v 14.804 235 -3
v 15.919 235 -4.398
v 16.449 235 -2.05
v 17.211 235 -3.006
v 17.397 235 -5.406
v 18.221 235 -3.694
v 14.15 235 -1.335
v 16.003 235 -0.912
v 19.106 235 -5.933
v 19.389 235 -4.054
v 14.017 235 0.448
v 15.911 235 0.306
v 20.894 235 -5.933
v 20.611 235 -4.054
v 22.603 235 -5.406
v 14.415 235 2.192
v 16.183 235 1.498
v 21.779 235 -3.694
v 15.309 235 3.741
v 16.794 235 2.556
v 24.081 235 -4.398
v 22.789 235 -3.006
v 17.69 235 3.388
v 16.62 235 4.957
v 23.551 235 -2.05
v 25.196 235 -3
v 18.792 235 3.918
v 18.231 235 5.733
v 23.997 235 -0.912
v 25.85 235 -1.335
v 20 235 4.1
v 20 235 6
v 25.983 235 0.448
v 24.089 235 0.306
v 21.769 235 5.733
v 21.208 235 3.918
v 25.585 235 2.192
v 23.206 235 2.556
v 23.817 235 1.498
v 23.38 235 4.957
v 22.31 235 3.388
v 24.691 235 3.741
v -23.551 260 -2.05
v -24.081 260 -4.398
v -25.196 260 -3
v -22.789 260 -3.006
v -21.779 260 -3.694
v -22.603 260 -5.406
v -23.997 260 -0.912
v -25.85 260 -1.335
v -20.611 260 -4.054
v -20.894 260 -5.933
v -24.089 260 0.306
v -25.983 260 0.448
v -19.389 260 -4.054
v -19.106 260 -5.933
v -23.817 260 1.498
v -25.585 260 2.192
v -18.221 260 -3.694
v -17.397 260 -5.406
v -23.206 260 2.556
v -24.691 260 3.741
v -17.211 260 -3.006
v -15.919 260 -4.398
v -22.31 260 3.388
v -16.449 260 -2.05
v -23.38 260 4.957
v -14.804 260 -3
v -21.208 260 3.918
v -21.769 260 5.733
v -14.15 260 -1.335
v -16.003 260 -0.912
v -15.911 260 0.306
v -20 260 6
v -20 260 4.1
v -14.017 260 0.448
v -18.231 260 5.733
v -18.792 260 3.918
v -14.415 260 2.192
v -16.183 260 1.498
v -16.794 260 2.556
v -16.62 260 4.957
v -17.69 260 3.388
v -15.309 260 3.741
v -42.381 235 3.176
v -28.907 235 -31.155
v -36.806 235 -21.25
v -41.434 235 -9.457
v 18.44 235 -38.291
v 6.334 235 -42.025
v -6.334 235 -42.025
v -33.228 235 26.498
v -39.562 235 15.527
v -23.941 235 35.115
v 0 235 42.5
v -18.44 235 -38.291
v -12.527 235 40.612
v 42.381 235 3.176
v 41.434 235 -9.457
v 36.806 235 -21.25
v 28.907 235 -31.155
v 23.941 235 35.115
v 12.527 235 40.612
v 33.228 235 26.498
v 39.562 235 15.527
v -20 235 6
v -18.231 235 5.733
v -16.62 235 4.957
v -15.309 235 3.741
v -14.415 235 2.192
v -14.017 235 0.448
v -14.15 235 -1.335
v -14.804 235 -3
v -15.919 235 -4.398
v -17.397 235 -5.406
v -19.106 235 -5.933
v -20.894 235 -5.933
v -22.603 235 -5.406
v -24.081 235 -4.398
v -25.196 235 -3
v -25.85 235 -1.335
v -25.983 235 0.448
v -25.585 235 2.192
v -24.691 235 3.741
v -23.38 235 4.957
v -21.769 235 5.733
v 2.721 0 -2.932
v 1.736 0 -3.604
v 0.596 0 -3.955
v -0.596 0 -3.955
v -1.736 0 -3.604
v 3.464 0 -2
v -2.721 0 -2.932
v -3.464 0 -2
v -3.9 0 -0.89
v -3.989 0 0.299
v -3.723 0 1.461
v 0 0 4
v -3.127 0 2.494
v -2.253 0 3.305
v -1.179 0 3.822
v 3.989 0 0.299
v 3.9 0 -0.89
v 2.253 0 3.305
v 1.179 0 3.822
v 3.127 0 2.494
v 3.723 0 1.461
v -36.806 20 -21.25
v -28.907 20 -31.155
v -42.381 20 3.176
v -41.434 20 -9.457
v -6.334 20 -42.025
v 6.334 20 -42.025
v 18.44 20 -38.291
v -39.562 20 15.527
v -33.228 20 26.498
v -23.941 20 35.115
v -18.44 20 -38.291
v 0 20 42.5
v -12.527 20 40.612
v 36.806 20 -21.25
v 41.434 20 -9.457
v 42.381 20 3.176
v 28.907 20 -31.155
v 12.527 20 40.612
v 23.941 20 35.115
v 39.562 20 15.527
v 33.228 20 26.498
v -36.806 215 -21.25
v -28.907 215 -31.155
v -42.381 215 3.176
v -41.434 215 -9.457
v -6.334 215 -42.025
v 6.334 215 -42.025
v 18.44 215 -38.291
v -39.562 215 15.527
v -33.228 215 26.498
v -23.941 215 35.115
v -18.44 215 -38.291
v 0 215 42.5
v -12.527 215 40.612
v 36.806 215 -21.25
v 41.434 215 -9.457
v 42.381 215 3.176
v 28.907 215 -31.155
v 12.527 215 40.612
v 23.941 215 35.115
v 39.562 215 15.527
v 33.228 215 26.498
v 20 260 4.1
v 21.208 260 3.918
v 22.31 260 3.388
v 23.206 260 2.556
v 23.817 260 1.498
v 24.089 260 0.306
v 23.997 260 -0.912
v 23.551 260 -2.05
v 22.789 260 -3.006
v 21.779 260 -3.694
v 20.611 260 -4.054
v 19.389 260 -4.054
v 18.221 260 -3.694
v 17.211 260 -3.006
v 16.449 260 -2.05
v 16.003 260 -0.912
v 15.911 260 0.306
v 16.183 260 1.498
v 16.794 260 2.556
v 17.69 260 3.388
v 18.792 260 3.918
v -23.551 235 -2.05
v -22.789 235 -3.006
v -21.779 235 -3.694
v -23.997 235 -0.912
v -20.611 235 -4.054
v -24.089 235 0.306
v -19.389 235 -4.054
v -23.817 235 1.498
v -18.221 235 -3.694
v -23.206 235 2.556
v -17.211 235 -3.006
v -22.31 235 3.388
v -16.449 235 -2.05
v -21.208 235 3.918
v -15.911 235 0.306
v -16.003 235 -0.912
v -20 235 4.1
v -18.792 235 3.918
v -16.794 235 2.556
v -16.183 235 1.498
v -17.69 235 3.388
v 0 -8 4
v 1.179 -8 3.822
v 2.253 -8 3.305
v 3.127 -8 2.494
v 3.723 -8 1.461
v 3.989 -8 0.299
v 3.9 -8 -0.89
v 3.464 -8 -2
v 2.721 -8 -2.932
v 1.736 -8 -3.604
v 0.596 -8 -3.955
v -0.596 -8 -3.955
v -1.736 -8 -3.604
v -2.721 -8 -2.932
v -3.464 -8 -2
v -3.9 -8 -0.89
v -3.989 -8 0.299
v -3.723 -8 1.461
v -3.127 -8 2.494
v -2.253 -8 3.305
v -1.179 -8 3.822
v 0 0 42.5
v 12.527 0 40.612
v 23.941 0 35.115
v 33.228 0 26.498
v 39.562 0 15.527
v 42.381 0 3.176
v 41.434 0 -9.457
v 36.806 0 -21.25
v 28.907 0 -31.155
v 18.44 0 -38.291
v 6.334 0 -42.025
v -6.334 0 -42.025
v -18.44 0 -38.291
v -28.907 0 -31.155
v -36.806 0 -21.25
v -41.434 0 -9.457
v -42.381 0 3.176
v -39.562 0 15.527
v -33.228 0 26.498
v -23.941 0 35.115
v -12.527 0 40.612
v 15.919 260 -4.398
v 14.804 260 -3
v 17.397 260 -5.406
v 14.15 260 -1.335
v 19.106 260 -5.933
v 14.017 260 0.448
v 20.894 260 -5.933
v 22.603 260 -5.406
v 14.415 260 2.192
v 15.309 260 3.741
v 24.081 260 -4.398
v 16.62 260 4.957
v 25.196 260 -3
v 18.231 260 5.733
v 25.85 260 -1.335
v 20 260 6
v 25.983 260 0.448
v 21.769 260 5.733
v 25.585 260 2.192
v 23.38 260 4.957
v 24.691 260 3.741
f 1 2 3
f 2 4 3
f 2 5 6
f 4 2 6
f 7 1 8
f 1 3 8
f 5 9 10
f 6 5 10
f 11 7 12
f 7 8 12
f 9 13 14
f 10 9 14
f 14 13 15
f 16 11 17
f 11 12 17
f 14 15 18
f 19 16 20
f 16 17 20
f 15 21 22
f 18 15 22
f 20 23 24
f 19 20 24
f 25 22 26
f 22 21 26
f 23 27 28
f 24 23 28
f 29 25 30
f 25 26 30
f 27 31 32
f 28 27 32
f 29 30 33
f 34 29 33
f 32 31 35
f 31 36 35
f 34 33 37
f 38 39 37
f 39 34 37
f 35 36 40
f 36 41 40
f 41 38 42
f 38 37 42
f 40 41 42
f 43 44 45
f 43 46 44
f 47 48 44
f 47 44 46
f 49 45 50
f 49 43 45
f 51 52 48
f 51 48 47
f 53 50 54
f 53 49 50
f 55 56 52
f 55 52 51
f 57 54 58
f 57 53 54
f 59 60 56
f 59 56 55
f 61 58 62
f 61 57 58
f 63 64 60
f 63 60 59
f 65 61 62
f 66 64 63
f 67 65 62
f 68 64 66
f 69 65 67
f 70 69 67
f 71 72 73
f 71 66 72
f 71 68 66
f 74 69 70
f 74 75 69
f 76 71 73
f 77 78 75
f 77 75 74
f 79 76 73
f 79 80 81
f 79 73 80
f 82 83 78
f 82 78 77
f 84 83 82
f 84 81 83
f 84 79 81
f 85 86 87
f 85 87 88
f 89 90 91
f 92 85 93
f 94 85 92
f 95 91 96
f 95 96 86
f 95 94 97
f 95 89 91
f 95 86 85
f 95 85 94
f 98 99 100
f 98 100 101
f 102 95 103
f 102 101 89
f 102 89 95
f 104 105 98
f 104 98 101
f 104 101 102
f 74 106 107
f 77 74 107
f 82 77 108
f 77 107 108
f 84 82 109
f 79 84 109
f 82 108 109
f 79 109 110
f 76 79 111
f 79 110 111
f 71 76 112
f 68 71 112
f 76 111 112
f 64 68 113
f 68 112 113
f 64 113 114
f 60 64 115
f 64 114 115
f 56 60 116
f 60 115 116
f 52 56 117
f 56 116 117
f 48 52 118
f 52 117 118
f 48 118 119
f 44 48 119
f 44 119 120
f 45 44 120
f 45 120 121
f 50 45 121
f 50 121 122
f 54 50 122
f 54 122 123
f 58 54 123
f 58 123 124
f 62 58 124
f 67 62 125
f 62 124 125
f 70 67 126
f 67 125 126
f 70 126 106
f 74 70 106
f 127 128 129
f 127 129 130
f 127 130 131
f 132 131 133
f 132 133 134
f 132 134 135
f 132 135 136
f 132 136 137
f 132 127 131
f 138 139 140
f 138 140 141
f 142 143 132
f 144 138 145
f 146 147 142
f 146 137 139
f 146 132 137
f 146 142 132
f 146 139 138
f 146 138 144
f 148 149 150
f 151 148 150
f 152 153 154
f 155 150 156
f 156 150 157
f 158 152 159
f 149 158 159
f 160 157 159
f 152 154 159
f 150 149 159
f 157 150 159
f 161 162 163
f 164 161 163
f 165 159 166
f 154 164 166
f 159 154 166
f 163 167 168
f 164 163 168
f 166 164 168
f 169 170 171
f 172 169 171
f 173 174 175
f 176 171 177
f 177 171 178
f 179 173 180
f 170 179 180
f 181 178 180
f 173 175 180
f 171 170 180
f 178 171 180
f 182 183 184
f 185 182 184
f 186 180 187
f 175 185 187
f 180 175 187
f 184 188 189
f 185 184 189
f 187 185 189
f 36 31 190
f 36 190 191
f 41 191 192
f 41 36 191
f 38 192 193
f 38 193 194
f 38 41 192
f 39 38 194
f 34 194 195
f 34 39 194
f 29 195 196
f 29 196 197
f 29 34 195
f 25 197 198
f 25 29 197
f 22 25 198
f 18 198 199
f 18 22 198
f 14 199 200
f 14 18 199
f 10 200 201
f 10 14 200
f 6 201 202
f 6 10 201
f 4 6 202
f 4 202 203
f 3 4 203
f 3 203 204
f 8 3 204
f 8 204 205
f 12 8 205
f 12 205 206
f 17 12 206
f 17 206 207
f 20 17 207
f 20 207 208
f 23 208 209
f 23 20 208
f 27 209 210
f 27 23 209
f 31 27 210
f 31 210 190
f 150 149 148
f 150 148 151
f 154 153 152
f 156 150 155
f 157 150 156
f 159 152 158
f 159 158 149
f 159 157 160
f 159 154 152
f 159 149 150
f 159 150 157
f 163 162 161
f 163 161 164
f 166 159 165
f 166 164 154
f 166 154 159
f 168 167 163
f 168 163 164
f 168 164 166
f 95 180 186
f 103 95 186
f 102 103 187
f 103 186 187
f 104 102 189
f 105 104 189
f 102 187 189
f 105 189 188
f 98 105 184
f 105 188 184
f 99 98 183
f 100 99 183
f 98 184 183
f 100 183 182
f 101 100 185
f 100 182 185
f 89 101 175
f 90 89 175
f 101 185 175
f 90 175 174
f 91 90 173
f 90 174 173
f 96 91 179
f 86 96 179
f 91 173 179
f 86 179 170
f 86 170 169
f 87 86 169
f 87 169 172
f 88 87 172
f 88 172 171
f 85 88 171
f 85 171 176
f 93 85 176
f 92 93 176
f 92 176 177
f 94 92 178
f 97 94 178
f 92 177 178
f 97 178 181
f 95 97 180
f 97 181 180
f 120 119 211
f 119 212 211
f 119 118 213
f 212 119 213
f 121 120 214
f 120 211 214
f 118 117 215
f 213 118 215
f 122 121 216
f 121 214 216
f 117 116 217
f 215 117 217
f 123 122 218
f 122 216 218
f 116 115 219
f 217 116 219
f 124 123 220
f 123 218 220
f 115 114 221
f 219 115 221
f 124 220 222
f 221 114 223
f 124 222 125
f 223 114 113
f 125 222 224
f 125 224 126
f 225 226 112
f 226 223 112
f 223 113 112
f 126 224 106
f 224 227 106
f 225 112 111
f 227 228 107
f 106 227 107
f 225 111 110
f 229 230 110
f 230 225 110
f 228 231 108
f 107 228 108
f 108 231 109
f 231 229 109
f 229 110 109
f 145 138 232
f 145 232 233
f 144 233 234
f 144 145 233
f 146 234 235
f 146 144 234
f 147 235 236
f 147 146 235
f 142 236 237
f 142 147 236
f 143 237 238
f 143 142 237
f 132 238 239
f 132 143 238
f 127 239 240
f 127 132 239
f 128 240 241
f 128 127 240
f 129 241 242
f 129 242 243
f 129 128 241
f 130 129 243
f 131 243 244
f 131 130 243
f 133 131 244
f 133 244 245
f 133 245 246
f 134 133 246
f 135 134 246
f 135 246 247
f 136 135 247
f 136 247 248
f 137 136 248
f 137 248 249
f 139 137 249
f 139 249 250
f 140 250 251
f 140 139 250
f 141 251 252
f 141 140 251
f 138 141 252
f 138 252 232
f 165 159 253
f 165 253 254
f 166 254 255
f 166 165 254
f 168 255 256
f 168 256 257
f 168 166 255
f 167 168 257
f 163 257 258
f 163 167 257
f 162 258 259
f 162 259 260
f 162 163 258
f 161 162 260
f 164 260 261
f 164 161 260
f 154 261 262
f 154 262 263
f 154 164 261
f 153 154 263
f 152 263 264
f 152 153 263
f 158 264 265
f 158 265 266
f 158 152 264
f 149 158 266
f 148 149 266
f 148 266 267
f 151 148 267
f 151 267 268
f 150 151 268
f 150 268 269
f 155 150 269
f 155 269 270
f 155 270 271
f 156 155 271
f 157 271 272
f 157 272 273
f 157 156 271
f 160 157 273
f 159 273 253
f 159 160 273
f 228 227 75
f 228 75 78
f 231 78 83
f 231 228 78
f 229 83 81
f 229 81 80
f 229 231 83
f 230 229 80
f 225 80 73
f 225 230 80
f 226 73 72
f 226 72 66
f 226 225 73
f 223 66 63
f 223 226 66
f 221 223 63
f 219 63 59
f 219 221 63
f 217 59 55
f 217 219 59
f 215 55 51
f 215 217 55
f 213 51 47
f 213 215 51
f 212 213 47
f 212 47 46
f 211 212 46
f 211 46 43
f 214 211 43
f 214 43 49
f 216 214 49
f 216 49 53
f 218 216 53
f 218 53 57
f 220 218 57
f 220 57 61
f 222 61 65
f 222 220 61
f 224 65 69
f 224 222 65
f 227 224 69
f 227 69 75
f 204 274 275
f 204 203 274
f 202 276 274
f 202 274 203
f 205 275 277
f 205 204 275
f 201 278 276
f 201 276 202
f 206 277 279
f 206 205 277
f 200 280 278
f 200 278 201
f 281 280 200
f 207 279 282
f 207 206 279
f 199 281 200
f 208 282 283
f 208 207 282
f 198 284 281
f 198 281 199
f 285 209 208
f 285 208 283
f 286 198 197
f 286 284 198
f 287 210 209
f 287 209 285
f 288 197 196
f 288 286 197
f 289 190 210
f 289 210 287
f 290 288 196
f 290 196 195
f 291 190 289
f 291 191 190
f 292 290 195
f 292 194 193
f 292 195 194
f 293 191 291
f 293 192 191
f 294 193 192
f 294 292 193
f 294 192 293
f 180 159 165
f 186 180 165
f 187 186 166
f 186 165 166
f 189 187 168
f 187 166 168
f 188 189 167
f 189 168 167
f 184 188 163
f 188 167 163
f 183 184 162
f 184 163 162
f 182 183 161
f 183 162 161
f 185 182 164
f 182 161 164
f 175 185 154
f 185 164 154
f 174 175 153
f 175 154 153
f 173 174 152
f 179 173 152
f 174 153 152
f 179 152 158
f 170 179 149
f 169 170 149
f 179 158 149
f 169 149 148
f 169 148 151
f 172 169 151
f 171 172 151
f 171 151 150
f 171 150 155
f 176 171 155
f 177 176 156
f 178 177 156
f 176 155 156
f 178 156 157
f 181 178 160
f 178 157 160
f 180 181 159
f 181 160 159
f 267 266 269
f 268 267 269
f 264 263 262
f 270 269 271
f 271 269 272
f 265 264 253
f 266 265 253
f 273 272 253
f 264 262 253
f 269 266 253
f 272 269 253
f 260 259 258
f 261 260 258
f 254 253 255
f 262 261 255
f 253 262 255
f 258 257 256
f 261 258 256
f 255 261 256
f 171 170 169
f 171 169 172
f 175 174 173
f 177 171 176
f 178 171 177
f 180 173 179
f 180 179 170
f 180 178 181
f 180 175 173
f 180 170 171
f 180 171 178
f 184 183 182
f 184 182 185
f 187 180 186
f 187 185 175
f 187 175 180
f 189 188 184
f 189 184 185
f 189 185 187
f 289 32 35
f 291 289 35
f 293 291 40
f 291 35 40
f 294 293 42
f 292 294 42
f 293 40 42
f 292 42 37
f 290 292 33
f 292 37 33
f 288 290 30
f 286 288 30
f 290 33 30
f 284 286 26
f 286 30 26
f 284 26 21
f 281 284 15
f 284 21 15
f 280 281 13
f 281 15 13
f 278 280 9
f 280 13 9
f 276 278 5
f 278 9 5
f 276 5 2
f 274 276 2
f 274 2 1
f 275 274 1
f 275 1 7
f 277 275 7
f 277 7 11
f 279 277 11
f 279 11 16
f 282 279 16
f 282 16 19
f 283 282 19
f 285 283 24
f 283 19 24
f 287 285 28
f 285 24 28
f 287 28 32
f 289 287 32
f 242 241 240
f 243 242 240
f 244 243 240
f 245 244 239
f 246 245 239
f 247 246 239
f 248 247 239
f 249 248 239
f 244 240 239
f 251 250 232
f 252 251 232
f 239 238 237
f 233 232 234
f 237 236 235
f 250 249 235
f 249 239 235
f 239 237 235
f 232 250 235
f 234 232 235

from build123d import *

# Parameters (mm, degrees)
VESSEL_D85_CATALOGUE_START                     = 20
SKETCH1_R                                      = 42.5
VESSEL_D85_CATALOGUE_DEPTH                     = 195
BOTTOM_HEAD_ENVELOPE_START                     = 20
SKETCH2_R                                      = 42.5
BOTTOM_HEAD_ENVELOPE_DEPTH                     = 20
TOP_HEAD_ENVELOPE_START                        = 215
SKETCH3_R                                      = 42.5
TOP_HEAD_ENVELOPE_DEPTH                        = 20
SKETCH4_R                                      = 4
M8_MOUNT_STUD_LENGTH_ASSUMED_DEPTH             = 8
INLET_ODS8_PROVISIONAL_POSITION_START          = 235
SKETCH5_R                                      = 6
SKETCH5_R_2                                    = 4.1
INLET_ODS8_PROVISIONAL_POSITION_DEPTH          = 25
LIQUID_OUTLET_DIP_TUBE_REQUIRED_ODS8_PRO_START = 235
SKETCH6_R                                      = 6
SKETCH6_R_2                                    = 4.1
LIQUID_OUTLET_DIP_TUBE_REQUIRED_ODS8_PRO_DEPTH = 25


with BuildPart() as part:
    # Sketch1 → Vessel_D85_catalogue (new body)
    with BuildSketch(Plane(origin=(0, 0, 0), x_dir=(1, 0, 0), z_dir=(0, 1, 0)).offset(VESSEL_D85_CATALOGUE_START)):
        with Locations(Location((0, 0, 0), (0, 0, 270))):
            Circle(SKETCH1_R)
    extrude(amount=VESSEL_D85_CATALOGUE_DEPTH)


with BuildPart() as body_2:
    # Sketch2 → Bottom_head_envelope (new body)
    with BuildSketch(Plane(origin=(0, 0, 0), x_dir=(1, 0, 0), z_dir=(0, 1, 0)).offset(BOTTOM_HEAD_ENVELOPE_START)):
        with Locations(Location((0, 0, 0), (0, 0, 270))):
            Circle(SKETCH2_R)
    extrude(amount=-BOTTOM_HEAD_ENVELOPE_DEPTH)


with BuildPart() as body_3:
    # Sketch3 → Top_head_envelope (new body)
    with BuildSketch(Plane(origin=(0, 0, 0), x_dir=(1, 0, 0), z_dir=(0, 1, 0)).offset(TOP_HEAD_ENVELOPE_START)):
        with Locations(Location((0, 0, 0), (0, 0, 270))):
            Circle(SKETCH3_R)
    extrude(amount=TOP_HEAD_ENVELOPE_DEPTH)


with BuildPart() as body_4:
    # Sketch4 → M8_mount_stud_length_assumed (new body)
    with BuildSketch(Plane(origin=(0, 0, 0), x_dir=(1, 0, 0), z_dir=(0, 1, 0))):
        with Locations(Location((0, 0, 0), (0, 0, 270))):
            Circle(SKETCH4_R)
    extrude(amount=-M8_MOUNT_STUD_LENGTH_ASSUMED_DEPTH)


with BuildPart() as body_5:
    # Sketch5 → Inlet_ODS8_provisional_position (new body)
    with BuildSketch(Plane(origin=(0, 0, 0), x_dir=(1, 0, 0), z_dir=(0, 1, 0)).offset(INLET_ODS8_PROVISIONAL_POSITION_START)):
        with Locations(Location((-20, 0, 0), (0, 0, 270))):
            Circle(SKETCH5_R)
        with Locations(Location((-20, 0, 0), (0, 0, 270))):
            Circle(SKETCH5_R_2, mode=Mode.SUBTRACT)
    extrude(amount=INLET_ODS8_PROVISIONAL_POSITION_DEPTH)


with BuildPart() as body_6:
    # Sketch6 → Liquid_outlet_dip_tube_required_ODS8_provisional_position (new body)
    with BuildSketch(Plane(origin=(0, 0, 0), x_dir=(1, 0, 0), z_dir=(0, 1, 0)).offset(LIQUID_OUTLET_DIP_TUBE_REQUIRED_ODS8_PRO_START)):
        with Locations(Location((20, 0, 0), (0, 0, 270))):
            Circle(SKETCH6_R)
        with Locations(Location((20, 0, 0), (0, 0, 270))):
            Circle(SKETCH6_R_2, mode=Mode.SUBTRACT)
    extrude(amount=LIQUID_OUTLET_DIP_TUBE_REQUIRED_ODS8_PRO_DEPTH)


solid = Compound([part.part, body_2.part, body_3.part, body_4.part, body_5.part, body_6.part])
